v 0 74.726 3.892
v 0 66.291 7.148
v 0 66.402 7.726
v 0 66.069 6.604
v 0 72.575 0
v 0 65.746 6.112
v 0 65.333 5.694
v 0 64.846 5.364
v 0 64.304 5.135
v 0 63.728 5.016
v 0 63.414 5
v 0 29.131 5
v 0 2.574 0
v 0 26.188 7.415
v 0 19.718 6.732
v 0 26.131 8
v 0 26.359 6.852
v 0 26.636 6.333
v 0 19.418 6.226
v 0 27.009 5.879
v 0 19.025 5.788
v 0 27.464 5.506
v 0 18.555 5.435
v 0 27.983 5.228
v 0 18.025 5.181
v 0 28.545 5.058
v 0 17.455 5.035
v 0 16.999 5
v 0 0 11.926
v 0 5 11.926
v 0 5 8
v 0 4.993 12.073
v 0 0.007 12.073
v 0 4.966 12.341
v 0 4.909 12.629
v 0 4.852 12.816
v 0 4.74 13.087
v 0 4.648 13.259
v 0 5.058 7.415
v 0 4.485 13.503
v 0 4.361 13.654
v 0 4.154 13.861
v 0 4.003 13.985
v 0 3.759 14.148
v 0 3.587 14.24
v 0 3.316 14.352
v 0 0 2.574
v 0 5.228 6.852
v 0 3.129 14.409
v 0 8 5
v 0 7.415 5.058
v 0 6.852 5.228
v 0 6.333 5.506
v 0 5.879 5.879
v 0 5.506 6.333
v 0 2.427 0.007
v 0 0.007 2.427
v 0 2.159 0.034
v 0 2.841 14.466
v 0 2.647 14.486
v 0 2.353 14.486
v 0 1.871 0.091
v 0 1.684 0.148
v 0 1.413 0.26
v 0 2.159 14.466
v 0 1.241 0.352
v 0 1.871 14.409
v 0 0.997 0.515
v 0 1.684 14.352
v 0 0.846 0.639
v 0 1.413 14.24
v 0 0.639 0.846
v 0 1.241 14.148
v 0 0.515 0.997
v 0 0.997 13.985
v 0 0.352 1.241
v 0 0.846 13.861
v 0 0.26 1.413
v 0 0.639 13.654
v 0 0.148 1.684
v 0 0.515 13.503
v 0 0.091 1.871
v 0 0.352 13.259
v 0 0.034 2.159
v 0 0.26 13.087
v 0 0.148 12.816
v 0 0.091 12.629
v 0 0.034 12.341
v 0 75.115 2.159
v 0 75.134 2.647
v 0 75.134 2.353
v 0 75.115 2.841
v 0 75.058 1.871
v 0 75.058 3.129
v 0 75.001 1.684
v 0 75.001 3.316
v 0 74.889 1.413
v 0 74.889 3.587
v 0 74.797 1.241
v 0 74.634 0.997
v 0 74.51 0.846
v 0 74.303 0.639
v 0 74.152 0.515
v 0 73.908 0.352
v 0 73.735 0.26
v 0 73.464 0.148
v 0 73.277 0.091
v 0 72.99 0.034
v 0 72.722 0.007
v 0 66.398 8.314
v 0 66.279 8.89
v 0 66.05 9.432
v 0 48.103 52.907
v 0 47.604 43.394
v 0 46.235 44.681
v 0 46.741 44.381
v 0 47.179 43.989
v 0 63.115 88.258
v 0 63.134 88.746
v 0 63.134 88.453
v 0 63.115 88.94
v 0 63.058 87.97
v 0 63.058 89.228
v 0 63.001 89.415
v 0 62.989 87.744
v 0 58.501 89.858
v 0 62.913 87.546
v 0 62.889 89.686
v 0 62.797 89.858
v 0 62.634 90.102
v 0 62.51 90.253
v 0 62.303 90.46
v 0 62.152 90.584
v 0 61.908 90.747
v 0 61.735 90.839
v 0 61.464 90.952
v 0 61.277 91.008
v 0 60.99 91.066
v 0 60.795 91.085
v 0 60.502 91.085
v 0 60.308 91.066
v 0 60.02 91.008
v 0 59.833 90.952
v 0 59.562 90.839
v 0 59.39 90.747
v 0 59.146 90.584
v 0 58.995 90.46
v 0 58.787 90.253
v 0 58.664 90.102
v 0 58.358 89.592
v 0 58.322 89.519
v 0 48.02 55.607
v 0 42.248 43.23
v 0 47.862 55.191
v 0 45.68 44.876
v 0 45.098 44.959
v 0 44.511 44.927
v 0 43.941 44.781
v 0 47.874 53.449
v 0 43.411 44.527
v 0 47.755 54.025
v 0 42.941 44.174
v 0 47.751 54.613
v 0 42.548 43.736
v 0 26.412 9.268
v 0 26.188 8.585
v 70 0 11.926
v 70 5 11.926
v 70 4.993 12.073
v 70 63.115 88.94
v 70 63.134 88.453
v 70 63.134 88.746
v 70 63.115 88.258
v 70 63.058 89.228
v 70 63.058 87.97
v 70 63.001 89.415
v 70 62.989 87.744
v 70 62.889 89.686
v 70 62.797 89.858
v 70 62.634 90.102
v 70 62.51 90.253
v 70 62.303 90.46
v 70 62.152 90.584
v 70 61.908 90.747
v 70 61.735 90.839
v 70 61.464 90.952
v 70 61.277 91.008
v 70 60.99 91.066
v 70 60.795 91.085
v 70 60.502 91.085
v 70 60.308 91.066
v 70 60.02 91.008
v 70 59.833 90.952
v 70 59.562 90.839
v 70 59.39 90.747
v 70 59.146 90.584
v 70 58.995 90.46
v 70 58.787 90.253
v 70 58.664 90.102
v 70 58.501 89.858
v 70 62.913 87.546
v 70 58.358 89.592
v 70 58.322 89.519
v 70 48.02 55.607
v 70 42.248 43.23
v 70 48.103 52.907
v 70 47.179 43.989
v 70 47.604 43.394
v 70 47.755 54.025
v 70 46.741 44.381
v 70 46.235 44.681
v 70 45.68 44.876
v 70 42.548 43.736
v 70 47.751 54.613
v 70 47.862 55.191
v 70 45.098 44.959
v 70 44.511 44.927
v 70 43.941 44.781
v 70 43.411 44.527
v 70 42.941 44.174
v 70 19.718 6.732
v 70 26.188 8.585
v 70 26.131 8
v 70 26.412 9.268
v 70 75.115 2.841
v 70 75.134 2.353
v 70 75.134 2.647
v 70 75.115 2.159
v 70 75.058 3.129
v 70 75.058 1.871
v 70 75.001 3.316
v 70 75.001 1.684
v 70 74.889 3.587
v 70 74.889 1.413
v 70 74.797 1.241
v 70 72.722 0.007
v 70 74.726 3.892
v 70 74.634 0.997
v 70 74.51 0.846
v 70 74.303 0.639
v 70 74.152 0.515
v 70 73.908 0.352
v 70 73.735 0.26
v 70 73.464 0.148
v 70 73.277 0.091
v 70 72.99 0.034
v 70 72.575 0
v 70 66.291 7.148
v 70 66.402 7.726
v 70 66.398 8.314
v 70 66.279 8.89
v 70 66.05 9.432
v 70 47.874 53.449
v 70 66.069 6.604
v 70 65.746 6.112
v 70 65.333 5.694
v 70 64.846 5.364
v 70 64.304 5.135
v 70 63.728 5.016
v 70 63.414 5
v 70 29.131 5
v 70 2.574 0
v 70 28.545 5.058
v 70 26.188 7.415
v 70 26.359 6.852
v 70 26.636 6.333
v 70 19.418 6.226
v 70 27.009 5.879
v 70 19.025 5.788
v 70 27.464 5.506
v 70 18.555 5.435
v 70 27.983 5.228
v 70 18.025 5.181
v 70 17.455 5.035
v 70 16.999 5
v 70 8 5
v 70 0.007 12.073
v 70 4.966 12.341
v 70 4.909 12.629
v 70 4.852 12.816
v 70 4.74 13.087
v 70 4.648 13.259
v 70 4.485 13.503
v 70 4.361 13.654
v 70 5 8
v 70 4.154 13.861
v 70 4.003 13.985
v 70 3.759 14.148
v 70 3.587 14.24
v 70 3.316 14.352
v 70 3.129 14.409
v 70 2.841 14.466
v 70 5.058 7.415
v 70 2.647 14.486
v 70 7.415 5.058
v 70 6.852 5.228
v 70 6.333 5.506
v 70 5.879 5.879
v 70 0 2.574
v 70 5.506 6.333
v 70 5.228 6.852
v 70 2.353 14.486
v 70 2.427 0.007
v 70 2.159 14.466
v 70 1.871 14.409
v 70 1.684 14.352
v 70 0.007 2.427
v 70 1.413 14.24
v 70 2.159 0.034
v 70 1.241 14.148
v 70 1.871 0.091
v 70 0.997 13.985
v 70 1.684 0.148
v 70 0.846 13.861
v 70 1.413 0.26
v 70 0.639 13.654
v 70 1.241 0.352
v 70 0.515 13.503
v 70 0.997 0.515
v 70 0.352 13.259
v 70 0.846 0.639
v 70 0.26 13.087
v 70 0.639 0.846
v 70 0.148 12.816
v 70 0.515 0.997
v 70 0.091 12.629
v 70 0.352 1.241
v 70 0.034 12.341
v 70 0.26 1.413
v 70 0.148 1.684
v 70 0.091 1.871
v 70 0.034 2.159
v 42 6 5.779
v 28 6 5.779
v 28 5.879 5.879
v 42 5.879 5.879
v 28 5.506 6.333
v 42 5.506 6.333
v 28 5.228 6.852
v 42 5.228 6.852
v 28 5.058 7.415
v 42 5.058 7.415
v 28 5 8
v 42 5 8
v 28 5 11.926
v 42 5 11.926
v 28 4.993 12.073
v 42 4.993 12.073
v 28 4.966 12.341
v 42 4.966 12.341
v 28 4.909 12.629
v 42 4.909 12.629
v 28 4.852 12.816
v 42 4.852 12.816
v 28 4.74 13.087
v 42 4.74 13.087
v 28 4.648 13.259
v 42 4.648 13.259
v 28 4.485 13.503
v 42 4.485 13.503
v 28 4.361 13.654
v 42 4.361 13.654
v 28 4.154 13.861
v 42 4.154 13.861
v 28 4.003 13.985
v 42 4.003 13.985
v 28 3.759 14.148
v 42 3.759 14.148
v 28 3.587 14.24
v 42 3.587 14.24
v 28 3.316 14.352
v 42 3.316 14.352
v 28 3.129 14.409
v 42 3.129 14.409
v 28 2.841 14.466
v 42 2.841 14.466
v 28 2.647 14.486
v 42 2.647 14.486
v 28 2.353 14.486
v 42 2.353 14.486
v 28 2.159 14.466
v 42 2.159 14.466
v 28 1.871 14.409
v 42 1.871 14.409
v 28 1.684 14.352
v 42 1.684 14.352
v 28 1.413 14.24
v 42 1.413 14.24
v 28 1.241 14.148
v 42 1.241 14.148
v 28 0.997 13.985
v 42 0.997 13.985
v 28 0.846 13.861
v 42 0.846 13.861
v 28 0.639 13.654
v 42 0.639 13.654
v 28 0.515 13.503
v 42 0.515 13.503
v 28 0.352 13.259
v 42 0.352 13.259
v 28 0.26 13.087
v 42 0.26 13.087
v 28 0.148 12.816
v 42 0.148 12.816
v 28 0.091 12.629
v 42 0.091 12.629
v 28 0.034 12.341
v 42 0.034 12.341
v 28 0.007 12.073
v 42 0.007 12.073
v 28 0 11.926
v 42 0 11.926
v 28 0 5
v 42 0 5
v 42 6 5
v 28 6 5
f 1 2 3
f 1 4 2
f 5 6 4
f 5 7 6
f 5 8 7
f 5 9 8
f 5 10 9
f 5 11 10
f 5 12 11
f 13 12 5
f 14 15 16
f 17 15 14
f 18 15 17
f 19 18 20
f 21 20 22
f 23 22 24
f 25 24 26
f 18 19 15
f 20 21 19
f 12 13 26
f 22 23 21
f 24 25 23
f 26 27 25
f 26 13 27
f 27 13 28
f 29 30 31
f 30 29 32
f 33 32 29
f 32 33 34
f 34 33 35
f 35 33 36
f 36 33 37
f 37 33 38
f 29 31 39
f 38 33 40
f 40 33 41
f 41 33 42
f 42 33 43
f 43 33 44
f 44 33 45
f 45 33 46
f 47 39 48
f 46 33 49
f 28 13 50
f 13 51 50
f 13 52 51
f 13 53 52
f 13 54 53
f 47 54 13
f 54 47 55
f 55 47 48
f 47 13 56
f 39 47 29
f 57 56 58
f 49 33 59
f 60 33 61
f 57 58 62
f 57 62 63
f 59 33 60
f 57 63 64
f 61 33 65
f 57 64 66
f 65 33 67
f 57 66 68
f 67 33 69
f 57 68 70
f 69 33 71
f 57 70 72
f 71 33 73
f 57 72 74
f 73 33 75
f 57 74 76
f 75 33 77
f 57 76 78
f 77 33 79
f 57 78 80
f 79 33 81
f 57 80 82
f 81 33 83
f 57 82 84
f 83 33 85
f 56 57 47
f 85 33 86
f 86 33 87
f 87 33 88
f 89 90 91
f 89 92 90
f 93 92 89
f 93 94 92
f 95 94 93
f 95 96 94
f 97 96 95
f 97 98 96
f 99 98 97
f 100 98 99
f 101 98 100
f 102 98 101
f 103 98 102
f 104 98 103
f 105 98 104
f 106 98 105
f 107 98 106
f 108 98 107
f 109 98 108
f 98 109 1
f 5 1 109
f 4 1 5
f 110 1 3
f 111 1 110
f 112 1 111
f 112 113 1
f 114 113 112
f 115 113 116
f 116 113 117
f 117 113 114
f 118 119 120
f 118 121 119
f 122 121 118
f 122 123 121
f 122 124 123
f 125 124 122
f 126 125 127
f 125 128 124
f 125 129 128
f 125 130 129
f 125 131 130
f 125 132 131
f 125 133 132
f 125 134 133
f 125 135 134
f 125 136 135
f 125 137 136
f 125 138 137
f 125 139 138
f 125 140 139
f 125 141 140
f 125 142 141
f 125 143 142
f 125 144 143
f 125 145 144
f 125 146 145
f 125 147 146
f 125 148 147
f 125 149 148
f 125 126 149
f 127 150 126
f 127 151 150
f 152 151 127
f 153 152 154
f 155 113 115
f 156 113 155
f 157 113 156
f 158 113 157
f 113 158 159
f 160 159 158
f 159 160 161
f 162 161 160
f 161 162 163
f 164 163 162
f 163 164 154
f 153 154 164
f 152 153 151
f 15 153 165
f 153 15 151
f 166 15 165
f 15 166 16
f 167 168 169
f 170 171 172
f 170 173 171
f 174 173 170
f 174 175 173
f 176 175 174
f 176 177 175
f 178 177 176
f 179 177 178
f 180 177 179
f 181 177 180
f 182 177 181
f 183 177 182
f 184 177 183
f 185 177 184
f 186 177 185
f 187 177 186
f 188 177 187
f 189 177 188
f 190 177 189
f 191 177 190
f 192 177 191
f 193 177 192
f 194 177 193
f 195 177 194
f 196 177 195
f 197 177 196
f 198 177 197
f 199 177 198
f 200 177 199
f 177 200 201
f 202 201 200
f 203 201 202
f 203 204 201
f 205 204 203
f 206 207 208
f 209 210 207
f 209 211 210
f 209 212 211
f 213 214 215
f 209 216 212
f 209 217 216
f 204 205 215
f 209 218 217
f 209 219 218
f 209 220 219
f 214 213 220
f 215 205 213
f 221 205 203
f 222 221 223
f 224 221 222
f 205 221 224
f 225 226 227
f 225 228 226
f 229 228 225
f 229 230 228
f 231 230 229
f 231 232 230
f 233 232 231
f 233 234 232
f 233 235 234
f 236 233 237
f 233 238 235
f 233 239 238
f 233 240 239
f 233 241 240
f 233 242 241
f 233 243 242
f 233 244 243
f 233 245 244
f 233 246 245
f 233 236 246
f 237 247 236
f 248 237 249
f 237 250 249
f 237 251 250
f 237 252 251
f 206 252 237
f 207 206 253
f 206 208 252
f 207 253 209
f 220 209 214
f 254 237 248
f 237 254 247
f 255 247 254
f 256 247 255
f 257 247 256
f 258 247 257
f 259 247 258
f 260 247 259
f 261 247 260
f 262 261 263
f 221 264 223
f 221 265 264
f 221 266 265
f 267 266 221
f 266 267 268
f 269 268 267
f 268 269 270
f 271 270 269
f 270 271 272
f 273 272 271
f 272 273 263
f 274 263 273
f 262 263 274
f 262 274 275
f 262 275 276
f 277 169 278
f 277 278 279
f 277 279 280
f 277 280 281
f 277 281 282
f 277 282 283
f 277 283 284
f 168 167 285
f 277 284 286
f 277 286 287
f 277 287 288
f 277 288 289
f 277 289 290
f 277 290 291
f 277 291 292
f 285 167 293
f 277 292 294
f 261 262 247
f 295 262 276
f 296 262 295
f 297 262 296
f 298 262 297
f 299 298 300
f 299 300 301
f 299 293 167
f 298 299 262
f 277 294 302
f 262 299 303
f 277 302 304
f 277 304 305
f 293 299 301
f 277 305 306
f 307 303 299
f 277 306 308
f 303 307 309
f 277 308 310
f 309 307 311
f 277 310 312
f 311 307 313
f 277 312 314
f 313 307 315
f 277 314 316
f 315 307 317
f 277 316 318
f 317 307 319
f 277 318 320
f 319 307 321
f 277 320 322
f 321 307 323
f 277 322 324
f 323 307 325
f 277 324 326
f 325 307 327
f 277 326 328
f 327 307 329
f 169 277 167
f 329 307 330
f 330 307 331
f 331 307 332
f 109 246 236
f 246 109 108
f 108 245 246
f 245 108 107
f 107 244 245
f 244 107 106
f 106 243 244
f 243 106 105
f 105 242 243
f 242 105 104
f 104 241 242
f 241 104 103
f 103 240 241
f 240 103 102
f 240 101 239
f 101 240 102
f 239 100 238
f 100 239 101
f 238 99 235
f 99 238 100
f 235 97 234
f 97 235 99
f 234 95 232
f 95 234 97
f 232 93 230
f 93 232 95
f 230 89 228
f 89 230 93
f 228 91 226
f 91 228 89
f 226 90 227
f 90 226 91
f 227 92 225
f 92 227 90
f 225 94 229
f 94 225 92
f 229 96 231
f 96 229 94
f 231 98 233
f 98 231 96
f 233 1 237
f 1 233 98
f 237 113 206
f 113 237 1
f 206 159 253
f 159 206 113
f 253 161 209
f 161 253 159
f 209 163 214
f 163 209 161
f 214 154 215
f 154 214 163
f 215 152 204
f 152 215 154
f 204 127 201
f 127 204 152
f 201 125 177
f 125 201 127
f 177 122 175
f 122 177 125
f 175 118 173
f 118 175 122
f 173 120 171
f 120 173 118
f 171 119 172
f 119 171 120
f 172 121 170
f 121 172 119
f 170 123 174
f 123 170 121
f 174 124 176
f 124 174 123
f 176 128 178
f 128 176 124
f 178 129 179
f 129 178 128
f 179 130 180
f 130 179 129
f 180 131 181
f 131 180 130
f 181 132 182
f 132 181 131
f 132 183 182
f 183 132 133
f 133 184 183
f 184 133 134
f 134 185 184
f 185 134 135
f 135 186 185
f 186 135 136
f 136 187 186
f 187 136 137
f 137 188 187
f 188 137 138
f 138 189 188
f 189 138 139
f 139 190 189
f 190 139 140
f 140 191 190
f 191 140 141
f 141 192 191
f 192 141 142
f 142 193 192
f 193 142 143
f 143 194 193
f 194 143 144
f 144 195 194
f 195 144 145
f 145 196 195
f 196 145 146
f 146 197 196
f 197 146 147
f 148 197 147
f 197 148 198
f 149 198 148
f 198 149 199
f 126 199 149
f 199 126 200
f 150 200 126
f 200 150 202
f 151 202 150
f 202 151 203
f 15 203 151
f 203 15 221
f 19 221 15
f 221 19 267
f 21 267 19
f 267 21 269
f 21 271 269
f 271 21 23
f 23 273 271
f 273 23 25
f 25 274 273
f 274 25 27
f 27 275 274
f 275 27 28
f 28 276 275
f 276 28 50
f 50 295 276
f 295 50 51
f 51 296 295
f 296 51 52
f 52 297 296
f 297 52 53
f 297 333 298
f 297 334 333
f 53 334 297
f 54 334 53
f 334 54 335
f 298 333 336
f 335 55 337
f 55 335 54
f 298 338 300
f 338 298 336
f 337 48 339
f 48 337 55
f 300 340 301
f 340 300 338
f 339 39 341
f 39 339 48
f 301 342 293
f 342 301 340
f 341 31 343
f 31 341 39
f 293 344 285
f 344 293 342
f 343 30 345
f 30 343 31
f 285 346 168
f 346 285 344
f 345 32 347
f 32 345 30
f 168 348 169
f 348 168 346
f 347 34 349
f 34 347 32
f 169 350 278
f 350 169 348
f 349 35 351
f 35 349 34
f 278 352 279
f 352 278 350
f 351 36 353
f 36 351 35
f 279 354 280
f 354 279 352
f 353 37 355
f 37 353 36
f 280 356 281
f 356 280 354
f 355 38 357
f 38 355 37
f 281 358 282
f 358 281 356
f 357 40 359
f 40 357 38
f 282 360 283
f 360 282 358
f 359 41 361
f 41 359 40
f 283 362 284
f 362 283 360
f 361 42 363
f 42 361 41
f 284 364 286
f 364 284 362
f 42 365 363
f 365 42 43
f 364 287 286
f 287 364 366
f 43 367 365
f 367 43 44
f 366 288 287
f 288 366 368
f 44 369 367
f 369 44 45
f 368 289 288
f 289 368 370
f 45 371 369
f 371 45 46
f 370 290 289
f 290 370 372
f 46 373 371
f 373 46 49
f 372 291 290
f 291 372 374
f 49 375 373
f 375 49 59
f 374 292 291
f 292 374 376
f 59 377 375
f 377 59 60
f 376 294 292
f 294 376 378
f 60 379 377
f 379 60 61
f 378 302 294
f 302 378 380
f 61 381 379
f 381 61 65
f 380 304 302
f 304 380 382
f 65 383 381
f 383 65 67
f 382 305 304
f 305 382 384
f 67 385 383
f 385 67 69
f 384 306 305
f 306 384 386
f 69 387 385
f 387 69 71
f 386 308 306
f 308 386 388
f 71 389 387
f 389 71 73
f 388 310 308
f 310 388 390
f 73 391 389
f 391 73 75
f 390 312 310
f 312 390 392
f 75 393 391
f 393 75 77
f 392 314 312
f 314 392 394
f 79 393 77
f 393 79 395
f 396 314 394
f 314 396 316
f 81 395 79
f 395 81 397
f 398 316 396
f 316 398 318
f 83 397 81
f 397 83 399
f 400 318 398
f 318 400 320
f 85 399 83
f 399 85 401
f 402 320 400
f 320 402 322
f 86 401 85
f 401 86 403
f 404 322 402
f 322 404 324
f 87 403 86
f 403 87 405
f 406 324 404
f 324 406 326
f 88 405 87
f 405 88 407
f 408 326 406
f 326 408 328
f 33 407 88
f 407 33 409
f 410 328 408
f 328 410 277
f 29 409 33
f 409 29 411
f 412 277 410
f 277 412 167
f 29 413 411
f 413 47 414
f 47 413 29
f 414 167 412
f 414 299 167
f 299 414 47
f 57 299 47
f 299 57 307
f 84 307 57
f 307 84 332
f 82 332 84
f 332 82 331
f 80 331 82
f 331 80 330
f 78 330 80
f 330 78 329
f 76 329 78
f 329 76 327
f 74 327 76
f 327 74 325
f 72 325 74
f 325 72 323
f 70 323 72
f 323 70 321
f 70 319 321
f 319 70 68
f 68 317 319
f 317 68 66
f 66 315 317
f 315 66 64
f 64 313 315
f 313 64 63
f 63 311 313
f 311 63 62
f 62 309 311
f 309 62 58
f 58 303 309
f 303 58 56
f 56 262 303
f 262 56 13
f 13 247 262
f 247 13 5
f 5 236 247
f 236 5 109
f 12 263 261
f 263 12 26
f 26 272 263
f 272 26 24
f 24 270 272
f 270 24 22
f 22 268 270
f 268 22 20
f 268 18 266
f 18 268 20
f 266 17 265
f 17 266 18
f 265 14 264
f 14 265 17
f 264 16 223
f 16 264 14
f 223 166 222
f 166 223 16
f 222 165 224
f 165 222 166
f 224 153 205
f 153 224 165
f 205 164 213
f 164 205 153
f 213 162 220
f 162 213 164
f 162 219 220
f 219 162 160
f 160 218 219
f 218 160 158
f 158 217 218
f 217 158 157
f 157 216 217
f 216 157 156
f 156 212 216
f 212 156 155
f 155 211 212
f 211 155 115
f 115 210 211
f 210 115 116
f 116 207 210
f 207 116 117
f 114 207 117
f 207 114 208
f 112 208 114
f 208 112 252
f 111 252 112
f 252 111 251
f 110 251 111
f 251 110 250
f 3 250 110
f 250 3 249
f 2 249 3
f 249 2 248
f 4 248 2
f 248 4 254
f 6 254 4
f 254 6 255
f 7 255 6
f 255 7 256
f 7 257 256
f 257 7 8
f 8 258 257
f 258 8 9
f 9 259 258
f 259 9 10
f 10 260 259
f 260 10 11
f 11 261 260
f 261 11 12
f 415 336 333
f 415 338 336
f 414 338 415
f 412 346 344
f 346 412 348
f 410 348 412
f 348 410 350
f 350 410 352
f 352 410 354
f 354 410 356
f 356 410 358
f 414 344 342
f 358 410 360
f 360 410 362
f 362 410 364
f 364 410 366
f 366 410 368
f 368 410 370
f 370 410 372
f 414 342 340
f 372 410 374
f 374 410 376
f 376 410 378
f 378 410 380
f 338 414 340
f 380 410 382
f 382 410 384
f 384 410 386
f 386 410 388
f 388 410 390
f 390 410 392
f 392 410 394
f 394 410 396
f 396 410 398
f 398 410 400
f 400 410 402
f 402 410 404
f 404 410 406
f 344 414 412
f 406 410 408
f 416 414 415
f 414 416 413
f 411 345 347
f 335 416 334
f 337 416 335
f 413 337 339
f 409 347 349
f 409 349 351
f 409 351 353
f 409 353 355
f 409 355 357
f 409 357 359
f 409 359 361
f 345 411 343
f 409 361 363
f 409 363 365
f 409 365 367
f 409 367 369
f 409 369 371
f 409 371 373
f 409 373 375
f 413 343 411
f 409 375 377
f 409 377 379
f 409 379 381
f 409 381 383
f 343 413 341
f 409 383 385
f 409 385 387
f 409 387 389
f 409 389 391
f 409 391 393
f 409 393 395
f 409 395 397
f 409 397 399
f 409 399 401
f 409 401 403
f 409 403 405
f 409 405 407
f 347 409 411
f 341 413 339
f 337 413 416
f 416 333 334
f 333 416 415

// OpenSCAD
// Подставка для телефона: наклонная спинка на треугольной опоре,
// полочка с бортиком и вырез под кабель. Печатается стоя, без поддержек.
$fn = 32;

/* [Подставка] */
// Ширина, мм
width = 70;             // [40:5:140]
// Толщина стенок, мм
thickness = 5;          // [3:0.5:10]
/* [Спинка] */
// Длина спинки, мм
back_length = 95;       // [50:5:160]
// Наклон спинки, °
back_angle = 65;        // [50:1:80]
/* [Полочка] */
// Глубина под телефон в чехле, мм
slot = 13;              // [8:0.5:25]
// Высота бортика, мм
lip = 12;               // [6:1:25]
/* [Кабель] */
// Ширина выреза под кабель, мм
cable = 14;             // [0:1:30]

t = thickness;
// Опорные точки профиля: y — вглубь от бортика, z — вверх.
lip_top = [t / 2, lip];
front = [t / 2, t / 2];
corner = [t / 2 + slot + t, t / 2];
back_top = corner + back_length * [cos(back_angle), sin(back_angle)];
brace = corner + back_length * 0.6 * [cos(back_angle), sin(back_angle)];
foot = [back_top[0] + 12, t / 2];

// Отрезок толщиной t со скруглёнными концами.
module bar(a, b) {
    hull() {
        translate(a) circle(d = t);
        translate(b) circle(d = t);
    }
}

module profile() {
    // Внутренние углы скруглены — ни одной острой ступеньки.
    offset(r = -3) offset(r = 3) {
        bar(lip_top, front);
        bar(front, corner);
        bar(corner, back_top);
        bar(corner, foot);
        bar(brace, foot);
    }
}

difference() {
    rotate([90, 0, 90]) linear_extrude(height = width) profile();
    // Вырез в бортике: кабель уходит вниз из разъёма.
    if (cable > 0)
        translate([(width - cable) / 2, -1, t])
            cube([cable, t + 2, lip + t]);
}
